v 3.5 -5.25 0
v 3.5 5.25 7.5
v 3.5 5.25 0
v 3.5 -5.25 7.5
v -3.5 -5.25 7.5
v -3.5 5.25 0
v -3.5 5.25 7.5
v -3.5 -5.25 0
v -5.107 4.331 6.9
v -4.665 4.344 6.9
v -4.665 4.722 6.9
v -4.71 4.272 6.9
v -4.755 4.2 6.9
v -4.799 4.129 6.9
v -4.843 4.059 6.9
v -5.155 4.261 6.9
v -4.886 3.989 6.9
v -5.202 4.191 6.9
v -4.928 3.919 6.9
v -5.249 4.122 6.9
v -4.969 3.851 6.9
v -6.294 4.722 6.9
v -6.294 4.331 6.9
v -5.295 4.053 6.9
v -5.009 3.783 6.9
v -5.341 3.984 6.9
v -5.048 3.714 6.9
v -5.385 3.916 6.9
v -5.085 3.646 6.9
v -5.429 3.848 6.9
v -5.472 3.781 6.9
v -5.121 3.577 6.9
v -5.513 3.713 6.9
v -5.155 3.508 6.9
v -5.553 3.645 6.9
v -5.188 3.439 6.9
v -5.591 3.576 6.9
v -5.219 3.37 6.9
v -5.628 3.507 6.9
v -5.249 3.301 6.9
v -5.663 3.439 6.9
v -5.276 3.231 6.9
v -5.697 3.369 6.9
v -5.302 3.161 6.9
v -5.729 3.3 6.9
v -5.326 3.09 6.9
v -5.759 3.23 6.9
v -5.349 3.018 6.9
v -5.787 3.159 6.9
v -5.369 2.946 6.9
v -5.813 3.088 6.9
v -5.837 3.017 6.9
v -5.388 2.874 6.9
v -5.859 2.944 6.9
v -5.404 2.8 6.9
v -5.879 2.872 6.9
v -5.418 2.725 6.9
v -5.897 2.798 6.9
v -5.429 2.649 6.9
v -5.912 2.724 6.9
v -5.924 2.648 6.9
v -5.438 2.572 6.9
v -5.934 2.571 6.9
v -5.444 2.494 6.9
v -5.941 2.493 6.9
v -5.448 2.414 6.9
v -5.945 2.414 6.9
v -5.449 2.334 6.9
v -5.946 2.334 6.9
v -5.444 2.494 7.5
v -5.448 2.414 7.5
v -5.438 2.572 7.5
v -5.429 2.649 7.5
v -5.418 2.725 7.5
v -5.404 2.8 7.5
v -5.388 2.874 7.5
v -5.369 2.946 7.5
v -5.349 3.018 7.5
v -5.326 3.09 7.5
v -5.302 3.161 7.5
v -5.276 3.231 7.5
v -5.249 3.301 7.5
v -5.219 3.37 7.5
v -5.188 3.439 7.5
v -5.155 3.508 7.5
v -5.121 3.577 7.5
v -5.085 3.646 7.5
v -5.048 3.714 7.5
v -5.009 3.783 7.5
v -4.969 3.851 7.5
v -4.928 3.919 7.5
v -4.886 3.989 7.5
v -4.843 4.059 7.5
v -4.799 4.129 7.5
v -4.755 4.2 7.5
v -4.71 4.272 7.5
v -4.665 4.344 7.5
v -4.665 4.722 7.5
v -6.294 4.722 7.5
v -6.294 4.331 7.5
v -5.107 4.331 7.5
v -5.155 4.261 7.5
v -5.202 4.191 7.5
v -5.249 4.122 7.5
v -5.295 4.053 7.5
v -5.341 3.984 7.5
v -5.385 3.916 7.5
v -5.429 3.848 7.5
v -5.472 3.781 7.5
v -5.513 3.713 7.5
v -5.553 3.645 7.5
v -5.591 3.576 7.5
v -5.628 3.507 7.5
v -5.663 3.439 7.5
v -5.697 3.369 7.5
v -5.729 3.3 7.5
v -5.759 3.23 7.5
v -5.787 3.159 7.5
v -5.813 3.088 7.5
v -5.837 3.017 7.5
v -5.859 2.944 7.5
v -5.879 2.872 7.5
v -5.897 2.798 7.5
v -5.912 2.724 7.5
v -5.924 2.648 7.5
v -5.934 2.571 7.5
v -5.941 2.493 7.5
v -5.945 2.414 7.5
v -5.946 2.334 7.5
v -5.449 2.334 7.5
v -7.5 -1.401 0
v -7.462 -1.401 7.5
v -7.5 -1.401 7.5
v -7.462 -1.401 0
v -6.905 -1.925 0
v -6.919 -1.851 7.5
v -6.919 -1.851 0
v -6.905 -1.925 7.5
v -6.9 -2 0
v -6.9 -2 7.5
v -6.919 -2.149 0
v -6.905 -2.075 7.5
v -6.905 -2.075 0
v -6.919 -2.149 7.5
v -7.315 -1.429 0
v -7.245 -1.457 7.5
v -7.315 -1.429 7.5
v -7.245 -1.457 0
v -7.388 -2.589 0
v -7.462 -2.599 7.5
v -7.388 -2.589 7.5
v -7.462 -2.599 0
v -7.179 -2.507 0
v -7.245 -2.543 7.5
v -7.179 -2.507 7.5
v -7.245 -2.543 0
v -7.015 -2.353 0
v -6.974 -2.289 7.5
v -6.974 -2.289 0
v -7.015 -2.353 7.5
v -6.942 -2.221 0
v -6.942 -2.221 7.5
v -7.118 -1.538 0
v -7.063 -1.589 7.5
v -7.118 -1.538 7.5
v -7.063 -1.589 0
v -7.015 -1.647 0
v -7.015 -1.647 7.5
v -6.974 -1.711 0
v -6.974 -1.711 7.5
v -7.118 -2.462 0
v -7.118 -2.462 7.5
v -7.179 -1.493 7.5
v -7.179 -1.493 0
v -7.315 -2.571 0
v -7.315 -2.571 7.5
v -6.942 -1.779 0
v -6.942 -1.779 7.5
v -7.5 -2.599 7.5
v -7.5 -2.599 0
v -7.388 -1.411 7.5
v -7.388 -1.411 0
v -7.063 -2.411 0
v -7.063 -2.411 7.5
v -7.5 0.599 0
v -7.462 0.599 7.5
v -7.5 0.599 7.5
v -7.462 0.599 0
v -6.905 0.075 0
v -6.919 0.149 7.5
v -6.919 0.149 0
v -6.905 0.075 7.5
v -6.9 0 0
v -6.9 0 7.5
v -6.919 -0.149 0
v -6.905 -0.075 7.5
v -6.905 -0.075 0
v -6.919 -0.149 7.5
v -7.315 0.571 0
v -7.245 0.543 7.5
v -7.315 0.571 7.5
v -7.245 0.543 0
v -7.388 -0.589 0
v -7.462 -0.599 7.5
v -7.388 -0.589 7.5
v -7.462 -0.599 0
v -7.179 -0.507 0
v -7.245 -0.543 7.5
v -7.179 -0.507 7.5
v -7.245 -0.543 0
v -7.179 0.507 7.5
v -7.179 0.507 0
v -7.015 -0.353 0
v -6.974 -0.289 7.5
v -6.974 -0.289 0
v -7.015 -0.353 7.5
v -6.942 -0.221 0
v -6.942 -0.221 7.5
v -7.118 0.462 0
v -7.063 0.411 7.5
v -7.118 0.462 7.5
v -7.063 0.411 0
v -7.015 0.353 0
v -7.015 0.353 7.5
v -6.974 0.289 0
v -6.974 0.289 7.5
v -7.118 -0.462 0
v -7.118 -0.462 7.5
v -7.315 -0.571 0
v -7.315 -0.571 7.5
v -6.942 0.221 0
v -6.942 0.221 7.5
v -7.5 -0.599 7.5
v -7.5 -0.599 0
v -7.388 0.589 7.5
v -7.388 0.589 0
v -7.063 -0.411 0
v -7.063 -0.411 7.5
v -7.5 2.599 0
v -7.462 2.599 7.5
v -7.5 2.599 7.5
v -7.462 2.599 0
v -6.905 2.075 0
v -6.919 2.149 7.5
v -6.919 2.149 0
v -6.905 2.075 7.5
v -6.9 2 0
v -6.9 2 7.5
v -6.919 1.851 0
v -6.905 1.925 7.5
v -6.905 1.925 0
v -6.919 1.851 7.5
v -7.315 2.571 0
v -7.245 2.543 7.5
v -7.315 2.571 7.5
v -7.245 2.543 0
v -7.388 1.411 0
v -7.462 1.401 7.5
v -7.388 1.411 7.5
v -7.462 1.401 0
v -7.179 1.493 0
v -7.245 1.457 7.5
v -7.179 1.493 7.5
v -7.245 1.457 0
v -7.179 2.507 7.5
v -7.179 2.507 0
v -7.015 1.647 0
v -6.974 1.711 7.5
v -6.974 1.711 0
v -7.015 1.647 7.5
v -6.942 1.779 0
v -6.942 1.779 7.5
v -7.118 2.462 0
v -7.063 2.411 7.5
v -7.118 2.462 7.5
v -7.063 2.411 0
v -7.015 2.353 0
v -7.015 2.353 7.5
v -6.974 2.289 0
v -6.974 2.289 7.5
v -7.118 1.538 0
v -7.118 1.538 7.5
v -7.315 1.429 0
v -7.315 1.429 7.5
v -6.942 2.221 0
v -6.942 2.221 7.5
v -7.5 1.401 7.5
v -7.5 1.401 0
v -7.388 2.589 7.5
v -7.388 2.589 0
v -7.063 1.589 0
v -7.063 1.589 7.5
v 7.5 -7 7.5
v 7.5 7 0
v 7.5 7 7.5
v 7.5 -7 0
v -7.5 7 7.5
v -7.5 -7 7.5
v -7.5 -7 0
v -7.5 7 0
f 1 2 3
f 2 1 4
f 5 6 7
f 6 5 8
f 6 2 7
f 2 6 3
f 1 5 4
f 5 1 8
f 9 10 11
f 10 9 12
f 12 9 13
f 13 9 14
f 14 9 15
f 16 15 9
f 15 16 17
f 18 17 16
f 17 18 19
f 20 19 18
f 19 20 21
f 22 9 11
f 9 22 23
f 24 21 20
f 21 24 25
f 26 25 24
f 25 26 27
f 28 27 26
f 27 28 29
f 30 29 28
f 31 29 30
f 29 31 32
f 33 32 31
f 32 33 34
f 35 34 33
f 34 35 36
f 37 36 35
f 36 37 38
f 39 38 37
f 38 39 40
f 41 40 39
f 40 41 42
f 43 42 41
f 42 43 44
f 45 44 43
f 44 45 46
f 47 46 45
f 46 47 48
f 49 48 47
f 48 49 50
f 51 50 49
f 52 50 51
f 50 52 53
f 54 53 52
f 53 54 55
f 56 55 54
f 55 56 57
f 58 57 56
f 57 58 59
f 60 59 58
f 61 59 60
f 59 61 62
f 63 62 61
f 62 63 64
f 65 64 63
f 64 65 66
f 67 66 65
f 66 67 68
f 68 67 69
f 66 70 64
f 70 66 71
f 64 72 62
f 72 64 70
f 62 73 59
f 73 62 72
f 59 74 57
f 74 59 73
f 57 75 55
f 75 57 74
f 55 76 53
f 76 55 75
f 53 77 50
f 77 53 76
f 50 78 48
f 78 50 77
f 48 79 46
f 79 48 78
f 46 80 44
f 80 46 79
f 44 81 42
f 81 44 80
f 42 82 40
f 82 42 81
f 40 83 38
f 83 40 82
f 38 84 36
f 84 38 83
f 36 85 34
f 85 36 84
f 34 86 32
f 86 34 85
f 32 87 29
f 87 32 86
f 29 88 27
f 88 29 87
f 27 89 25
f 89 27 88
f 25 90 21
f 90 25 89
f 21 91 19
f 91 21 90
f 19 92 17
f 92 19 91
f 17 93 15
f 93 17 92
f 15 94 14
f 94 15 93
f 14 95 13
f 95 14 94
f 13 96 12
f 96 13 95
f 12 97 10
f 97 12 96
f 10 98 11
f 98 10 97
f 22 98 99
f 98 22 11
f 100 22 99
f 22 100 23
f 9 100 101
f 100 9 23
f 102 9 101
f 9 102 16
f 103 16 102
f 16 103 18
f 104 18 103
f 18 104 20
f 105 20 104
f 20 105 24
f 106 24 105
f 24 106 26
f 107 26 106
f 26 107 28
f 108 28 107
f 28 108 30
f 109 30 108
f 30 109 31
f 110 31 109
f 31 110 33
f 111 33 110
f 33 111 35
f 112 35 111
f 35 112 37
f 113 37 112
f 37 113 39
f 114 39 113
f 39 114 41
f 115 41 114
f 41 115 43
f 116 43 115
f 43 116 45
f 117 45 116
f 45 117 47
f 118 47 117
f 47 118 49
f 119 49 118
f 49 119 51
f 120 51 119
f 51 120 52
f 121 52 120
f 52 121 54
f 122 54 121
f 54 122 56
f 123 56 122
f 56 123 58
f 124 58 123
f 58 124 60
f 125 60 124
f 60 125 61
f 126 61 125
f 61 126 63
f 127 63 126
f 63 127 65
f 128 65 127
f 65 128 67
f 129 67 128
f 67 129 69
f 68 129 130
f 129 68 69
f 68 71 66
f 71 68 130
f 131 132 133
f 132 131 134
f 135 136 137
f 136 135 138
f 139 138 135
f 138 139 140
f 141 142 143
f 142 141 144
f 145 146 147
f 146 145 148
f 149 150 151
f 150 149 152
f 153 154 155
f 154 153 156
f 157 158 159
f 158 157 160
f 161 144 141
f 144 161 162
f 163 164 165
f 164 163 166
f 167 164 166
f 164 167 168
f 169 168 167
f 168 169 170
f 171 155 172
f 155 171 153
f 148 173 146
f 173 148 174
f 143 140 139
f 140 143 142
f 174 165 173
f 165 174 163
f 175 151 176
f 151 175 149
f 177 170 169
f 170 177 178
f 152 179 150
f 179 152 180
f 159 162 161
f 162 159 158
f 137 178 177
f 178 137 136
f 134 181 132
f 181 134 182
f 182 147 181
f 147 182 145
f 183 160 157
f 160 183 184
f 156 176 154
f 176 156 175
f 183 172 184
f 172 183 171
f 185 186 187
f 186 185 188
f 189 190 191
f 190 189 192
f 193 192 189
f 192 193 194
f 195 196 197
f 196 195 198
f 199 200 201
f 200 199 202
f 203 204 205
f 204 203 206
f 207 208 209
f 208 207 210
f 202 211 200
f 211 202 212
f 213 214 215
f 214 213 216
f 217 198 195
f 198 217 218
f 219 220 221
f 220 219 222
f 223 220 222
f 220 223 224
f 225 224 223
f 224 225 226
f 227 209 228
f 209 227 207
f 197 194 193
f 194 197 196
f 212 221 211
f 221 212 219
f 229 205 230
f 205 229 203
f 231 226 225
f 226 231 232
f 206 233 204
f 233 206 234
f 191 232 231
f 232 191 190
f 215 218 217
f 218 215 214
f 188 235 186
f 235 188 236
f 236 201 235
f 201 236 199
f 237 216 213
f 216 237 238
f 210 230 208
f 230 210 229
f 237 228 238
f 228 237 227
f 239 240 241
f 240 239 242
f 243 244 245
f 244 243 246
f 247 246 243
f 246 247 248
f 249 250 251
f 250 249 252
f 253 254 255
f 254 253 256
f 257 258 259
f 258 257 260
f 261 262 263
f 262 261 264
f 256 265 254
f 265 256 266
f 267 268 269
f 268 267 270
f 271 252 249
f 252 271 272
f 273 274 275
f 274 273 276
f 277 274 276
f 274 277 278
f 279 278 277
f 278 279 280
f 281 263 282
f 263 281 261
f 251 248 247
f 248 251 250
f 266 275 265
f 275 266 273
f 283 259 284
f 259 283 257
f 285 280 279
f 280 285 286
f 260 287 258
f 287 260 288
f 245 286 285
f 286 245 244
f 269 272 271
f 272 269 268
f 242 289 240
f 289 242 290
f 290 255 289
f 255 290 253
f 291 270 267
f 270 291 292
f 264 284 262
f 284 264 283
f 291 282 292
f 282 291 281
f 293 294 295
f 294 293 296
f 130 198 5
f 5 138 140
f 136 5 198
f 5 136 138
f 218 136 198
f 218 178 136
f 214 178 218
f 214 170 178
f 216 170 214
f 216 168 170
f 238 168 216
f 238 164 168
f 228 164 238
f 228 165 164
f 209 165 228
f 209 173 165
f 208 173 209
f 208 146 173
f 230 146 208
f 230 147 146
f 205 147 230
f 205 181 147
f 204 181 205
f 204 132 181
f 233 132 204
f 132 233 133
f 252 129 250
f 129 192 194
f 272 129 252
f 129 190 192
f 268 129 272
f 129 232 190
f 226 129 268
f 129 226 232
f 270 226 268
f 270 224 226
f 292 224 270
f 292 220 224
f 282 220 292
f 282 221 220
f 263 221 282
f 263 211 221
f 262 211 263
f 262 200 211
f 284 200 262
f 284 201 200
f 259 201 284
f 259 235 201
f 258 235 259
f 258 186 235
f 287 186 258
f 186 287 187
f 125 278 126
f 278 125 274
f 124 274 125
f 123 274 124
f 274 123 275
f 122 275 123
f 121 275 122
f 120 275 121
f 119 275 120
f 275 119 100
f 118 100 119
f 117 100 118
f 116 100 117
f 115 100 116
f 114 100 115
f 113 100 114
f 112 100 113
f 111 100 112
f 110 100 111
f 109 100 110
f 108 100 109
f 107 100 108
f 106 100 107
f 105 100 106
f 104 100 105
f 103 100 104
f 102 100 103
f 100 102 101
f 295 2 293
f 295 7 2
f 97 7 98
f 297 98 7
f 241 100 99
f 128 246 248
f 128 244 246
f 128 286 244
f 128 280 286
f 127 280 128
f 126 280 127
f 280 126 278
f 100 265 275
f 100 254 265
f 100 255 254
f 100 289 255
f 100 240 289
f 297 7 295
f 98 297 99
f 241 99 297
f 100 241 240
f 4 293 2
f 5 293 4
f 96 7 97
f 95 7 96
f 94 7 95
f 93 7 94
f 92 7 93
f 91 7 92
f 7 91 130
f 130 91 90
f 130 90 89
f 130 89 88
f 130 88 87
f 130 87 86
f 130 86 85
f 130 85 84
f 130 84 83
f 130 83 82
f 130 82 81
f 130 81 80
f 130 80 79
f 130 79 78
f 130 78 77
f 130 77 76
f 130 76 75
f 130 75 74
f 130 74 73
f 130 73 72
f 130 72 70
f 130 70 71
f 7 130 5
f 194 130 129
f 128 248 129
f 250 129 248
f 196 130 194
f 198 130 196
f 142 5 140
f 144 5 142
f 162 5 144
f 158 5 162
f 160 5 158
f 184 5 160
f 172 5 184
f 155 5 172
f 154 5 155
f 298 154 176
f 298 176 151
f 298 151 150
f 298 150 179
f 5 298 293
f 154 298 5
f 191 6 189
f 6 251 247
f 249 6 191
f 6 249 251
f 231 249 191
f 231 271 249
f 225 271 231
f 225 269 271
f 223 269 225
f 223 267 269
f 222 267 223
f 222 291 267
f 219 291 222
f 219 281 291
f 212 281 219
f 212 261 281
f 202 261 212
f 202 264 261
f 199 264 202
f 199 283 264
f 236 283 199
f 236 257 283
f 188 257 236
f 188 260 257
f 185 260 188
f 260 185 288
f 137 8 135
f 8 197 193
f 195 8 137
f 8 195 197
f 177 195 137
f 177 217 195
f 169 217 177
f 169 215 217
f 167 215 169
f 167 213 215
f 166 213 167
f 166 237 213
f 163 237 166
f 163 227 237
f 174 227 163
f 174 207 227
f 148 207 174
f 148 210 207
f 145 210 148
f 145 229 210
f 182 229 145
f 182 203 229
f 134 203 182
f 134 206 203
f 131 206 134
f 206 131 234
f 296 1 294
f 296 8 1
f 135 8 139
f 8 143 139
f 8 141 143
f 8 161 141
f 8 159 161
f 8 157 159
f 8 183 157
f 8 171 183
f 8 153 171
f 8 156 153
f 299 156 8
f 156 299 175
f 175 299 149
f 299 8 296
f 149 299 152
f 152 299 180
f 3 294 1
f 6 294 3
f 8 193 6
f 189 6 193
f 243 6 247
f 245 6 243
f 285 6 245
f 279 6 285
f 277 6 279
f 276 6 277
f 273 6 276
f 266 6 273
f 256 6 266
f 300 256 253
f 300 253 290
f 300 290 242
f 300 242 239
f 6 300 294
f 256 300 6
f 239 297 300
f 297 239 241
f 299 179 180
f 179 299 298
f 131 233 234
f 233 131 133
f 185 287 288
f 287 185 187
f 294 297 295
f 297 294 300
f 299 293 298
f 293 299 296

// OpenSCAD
$fn = 50;

difference() {
	union() {
		translate(v = [0, -5, 0]) {
			rotate(a = [0, 0, 0]) {
				difference() {
					union() {
						translate(v = [-7.5, -2.0, 0]) {
							cube(size = [15.0, 14.0, 7.5]);
						}
					}
					union() {
						translate(v = [-3.5, -0.25, -0.1]) {
							cube(size = [7.0, 10.5, 7.7]);
						}
						translate(v = [-5.5, 8.5, 6.9]) {
							linear_extrude(height = 0.7) {
								text(font = "Arial:style=Bold", halign = "center", size = 2.5, text = "7", valign = "center");
							}
						}
						translate(v = [-7.5, 3, -0.1]) {
							cylinder(h = 7.7, r = 0.6);
						}
						translate(v = [-7.5, 5, -0.1]) {
							cylinder(h = 7.7, r = 0.6);
						}
						translate(v = [-7.5, 7, -0.1]) {
							cylinder(h = 7.7, r = 0.6);
						}
					}
				}
			}
		}
	}
	union();
}
